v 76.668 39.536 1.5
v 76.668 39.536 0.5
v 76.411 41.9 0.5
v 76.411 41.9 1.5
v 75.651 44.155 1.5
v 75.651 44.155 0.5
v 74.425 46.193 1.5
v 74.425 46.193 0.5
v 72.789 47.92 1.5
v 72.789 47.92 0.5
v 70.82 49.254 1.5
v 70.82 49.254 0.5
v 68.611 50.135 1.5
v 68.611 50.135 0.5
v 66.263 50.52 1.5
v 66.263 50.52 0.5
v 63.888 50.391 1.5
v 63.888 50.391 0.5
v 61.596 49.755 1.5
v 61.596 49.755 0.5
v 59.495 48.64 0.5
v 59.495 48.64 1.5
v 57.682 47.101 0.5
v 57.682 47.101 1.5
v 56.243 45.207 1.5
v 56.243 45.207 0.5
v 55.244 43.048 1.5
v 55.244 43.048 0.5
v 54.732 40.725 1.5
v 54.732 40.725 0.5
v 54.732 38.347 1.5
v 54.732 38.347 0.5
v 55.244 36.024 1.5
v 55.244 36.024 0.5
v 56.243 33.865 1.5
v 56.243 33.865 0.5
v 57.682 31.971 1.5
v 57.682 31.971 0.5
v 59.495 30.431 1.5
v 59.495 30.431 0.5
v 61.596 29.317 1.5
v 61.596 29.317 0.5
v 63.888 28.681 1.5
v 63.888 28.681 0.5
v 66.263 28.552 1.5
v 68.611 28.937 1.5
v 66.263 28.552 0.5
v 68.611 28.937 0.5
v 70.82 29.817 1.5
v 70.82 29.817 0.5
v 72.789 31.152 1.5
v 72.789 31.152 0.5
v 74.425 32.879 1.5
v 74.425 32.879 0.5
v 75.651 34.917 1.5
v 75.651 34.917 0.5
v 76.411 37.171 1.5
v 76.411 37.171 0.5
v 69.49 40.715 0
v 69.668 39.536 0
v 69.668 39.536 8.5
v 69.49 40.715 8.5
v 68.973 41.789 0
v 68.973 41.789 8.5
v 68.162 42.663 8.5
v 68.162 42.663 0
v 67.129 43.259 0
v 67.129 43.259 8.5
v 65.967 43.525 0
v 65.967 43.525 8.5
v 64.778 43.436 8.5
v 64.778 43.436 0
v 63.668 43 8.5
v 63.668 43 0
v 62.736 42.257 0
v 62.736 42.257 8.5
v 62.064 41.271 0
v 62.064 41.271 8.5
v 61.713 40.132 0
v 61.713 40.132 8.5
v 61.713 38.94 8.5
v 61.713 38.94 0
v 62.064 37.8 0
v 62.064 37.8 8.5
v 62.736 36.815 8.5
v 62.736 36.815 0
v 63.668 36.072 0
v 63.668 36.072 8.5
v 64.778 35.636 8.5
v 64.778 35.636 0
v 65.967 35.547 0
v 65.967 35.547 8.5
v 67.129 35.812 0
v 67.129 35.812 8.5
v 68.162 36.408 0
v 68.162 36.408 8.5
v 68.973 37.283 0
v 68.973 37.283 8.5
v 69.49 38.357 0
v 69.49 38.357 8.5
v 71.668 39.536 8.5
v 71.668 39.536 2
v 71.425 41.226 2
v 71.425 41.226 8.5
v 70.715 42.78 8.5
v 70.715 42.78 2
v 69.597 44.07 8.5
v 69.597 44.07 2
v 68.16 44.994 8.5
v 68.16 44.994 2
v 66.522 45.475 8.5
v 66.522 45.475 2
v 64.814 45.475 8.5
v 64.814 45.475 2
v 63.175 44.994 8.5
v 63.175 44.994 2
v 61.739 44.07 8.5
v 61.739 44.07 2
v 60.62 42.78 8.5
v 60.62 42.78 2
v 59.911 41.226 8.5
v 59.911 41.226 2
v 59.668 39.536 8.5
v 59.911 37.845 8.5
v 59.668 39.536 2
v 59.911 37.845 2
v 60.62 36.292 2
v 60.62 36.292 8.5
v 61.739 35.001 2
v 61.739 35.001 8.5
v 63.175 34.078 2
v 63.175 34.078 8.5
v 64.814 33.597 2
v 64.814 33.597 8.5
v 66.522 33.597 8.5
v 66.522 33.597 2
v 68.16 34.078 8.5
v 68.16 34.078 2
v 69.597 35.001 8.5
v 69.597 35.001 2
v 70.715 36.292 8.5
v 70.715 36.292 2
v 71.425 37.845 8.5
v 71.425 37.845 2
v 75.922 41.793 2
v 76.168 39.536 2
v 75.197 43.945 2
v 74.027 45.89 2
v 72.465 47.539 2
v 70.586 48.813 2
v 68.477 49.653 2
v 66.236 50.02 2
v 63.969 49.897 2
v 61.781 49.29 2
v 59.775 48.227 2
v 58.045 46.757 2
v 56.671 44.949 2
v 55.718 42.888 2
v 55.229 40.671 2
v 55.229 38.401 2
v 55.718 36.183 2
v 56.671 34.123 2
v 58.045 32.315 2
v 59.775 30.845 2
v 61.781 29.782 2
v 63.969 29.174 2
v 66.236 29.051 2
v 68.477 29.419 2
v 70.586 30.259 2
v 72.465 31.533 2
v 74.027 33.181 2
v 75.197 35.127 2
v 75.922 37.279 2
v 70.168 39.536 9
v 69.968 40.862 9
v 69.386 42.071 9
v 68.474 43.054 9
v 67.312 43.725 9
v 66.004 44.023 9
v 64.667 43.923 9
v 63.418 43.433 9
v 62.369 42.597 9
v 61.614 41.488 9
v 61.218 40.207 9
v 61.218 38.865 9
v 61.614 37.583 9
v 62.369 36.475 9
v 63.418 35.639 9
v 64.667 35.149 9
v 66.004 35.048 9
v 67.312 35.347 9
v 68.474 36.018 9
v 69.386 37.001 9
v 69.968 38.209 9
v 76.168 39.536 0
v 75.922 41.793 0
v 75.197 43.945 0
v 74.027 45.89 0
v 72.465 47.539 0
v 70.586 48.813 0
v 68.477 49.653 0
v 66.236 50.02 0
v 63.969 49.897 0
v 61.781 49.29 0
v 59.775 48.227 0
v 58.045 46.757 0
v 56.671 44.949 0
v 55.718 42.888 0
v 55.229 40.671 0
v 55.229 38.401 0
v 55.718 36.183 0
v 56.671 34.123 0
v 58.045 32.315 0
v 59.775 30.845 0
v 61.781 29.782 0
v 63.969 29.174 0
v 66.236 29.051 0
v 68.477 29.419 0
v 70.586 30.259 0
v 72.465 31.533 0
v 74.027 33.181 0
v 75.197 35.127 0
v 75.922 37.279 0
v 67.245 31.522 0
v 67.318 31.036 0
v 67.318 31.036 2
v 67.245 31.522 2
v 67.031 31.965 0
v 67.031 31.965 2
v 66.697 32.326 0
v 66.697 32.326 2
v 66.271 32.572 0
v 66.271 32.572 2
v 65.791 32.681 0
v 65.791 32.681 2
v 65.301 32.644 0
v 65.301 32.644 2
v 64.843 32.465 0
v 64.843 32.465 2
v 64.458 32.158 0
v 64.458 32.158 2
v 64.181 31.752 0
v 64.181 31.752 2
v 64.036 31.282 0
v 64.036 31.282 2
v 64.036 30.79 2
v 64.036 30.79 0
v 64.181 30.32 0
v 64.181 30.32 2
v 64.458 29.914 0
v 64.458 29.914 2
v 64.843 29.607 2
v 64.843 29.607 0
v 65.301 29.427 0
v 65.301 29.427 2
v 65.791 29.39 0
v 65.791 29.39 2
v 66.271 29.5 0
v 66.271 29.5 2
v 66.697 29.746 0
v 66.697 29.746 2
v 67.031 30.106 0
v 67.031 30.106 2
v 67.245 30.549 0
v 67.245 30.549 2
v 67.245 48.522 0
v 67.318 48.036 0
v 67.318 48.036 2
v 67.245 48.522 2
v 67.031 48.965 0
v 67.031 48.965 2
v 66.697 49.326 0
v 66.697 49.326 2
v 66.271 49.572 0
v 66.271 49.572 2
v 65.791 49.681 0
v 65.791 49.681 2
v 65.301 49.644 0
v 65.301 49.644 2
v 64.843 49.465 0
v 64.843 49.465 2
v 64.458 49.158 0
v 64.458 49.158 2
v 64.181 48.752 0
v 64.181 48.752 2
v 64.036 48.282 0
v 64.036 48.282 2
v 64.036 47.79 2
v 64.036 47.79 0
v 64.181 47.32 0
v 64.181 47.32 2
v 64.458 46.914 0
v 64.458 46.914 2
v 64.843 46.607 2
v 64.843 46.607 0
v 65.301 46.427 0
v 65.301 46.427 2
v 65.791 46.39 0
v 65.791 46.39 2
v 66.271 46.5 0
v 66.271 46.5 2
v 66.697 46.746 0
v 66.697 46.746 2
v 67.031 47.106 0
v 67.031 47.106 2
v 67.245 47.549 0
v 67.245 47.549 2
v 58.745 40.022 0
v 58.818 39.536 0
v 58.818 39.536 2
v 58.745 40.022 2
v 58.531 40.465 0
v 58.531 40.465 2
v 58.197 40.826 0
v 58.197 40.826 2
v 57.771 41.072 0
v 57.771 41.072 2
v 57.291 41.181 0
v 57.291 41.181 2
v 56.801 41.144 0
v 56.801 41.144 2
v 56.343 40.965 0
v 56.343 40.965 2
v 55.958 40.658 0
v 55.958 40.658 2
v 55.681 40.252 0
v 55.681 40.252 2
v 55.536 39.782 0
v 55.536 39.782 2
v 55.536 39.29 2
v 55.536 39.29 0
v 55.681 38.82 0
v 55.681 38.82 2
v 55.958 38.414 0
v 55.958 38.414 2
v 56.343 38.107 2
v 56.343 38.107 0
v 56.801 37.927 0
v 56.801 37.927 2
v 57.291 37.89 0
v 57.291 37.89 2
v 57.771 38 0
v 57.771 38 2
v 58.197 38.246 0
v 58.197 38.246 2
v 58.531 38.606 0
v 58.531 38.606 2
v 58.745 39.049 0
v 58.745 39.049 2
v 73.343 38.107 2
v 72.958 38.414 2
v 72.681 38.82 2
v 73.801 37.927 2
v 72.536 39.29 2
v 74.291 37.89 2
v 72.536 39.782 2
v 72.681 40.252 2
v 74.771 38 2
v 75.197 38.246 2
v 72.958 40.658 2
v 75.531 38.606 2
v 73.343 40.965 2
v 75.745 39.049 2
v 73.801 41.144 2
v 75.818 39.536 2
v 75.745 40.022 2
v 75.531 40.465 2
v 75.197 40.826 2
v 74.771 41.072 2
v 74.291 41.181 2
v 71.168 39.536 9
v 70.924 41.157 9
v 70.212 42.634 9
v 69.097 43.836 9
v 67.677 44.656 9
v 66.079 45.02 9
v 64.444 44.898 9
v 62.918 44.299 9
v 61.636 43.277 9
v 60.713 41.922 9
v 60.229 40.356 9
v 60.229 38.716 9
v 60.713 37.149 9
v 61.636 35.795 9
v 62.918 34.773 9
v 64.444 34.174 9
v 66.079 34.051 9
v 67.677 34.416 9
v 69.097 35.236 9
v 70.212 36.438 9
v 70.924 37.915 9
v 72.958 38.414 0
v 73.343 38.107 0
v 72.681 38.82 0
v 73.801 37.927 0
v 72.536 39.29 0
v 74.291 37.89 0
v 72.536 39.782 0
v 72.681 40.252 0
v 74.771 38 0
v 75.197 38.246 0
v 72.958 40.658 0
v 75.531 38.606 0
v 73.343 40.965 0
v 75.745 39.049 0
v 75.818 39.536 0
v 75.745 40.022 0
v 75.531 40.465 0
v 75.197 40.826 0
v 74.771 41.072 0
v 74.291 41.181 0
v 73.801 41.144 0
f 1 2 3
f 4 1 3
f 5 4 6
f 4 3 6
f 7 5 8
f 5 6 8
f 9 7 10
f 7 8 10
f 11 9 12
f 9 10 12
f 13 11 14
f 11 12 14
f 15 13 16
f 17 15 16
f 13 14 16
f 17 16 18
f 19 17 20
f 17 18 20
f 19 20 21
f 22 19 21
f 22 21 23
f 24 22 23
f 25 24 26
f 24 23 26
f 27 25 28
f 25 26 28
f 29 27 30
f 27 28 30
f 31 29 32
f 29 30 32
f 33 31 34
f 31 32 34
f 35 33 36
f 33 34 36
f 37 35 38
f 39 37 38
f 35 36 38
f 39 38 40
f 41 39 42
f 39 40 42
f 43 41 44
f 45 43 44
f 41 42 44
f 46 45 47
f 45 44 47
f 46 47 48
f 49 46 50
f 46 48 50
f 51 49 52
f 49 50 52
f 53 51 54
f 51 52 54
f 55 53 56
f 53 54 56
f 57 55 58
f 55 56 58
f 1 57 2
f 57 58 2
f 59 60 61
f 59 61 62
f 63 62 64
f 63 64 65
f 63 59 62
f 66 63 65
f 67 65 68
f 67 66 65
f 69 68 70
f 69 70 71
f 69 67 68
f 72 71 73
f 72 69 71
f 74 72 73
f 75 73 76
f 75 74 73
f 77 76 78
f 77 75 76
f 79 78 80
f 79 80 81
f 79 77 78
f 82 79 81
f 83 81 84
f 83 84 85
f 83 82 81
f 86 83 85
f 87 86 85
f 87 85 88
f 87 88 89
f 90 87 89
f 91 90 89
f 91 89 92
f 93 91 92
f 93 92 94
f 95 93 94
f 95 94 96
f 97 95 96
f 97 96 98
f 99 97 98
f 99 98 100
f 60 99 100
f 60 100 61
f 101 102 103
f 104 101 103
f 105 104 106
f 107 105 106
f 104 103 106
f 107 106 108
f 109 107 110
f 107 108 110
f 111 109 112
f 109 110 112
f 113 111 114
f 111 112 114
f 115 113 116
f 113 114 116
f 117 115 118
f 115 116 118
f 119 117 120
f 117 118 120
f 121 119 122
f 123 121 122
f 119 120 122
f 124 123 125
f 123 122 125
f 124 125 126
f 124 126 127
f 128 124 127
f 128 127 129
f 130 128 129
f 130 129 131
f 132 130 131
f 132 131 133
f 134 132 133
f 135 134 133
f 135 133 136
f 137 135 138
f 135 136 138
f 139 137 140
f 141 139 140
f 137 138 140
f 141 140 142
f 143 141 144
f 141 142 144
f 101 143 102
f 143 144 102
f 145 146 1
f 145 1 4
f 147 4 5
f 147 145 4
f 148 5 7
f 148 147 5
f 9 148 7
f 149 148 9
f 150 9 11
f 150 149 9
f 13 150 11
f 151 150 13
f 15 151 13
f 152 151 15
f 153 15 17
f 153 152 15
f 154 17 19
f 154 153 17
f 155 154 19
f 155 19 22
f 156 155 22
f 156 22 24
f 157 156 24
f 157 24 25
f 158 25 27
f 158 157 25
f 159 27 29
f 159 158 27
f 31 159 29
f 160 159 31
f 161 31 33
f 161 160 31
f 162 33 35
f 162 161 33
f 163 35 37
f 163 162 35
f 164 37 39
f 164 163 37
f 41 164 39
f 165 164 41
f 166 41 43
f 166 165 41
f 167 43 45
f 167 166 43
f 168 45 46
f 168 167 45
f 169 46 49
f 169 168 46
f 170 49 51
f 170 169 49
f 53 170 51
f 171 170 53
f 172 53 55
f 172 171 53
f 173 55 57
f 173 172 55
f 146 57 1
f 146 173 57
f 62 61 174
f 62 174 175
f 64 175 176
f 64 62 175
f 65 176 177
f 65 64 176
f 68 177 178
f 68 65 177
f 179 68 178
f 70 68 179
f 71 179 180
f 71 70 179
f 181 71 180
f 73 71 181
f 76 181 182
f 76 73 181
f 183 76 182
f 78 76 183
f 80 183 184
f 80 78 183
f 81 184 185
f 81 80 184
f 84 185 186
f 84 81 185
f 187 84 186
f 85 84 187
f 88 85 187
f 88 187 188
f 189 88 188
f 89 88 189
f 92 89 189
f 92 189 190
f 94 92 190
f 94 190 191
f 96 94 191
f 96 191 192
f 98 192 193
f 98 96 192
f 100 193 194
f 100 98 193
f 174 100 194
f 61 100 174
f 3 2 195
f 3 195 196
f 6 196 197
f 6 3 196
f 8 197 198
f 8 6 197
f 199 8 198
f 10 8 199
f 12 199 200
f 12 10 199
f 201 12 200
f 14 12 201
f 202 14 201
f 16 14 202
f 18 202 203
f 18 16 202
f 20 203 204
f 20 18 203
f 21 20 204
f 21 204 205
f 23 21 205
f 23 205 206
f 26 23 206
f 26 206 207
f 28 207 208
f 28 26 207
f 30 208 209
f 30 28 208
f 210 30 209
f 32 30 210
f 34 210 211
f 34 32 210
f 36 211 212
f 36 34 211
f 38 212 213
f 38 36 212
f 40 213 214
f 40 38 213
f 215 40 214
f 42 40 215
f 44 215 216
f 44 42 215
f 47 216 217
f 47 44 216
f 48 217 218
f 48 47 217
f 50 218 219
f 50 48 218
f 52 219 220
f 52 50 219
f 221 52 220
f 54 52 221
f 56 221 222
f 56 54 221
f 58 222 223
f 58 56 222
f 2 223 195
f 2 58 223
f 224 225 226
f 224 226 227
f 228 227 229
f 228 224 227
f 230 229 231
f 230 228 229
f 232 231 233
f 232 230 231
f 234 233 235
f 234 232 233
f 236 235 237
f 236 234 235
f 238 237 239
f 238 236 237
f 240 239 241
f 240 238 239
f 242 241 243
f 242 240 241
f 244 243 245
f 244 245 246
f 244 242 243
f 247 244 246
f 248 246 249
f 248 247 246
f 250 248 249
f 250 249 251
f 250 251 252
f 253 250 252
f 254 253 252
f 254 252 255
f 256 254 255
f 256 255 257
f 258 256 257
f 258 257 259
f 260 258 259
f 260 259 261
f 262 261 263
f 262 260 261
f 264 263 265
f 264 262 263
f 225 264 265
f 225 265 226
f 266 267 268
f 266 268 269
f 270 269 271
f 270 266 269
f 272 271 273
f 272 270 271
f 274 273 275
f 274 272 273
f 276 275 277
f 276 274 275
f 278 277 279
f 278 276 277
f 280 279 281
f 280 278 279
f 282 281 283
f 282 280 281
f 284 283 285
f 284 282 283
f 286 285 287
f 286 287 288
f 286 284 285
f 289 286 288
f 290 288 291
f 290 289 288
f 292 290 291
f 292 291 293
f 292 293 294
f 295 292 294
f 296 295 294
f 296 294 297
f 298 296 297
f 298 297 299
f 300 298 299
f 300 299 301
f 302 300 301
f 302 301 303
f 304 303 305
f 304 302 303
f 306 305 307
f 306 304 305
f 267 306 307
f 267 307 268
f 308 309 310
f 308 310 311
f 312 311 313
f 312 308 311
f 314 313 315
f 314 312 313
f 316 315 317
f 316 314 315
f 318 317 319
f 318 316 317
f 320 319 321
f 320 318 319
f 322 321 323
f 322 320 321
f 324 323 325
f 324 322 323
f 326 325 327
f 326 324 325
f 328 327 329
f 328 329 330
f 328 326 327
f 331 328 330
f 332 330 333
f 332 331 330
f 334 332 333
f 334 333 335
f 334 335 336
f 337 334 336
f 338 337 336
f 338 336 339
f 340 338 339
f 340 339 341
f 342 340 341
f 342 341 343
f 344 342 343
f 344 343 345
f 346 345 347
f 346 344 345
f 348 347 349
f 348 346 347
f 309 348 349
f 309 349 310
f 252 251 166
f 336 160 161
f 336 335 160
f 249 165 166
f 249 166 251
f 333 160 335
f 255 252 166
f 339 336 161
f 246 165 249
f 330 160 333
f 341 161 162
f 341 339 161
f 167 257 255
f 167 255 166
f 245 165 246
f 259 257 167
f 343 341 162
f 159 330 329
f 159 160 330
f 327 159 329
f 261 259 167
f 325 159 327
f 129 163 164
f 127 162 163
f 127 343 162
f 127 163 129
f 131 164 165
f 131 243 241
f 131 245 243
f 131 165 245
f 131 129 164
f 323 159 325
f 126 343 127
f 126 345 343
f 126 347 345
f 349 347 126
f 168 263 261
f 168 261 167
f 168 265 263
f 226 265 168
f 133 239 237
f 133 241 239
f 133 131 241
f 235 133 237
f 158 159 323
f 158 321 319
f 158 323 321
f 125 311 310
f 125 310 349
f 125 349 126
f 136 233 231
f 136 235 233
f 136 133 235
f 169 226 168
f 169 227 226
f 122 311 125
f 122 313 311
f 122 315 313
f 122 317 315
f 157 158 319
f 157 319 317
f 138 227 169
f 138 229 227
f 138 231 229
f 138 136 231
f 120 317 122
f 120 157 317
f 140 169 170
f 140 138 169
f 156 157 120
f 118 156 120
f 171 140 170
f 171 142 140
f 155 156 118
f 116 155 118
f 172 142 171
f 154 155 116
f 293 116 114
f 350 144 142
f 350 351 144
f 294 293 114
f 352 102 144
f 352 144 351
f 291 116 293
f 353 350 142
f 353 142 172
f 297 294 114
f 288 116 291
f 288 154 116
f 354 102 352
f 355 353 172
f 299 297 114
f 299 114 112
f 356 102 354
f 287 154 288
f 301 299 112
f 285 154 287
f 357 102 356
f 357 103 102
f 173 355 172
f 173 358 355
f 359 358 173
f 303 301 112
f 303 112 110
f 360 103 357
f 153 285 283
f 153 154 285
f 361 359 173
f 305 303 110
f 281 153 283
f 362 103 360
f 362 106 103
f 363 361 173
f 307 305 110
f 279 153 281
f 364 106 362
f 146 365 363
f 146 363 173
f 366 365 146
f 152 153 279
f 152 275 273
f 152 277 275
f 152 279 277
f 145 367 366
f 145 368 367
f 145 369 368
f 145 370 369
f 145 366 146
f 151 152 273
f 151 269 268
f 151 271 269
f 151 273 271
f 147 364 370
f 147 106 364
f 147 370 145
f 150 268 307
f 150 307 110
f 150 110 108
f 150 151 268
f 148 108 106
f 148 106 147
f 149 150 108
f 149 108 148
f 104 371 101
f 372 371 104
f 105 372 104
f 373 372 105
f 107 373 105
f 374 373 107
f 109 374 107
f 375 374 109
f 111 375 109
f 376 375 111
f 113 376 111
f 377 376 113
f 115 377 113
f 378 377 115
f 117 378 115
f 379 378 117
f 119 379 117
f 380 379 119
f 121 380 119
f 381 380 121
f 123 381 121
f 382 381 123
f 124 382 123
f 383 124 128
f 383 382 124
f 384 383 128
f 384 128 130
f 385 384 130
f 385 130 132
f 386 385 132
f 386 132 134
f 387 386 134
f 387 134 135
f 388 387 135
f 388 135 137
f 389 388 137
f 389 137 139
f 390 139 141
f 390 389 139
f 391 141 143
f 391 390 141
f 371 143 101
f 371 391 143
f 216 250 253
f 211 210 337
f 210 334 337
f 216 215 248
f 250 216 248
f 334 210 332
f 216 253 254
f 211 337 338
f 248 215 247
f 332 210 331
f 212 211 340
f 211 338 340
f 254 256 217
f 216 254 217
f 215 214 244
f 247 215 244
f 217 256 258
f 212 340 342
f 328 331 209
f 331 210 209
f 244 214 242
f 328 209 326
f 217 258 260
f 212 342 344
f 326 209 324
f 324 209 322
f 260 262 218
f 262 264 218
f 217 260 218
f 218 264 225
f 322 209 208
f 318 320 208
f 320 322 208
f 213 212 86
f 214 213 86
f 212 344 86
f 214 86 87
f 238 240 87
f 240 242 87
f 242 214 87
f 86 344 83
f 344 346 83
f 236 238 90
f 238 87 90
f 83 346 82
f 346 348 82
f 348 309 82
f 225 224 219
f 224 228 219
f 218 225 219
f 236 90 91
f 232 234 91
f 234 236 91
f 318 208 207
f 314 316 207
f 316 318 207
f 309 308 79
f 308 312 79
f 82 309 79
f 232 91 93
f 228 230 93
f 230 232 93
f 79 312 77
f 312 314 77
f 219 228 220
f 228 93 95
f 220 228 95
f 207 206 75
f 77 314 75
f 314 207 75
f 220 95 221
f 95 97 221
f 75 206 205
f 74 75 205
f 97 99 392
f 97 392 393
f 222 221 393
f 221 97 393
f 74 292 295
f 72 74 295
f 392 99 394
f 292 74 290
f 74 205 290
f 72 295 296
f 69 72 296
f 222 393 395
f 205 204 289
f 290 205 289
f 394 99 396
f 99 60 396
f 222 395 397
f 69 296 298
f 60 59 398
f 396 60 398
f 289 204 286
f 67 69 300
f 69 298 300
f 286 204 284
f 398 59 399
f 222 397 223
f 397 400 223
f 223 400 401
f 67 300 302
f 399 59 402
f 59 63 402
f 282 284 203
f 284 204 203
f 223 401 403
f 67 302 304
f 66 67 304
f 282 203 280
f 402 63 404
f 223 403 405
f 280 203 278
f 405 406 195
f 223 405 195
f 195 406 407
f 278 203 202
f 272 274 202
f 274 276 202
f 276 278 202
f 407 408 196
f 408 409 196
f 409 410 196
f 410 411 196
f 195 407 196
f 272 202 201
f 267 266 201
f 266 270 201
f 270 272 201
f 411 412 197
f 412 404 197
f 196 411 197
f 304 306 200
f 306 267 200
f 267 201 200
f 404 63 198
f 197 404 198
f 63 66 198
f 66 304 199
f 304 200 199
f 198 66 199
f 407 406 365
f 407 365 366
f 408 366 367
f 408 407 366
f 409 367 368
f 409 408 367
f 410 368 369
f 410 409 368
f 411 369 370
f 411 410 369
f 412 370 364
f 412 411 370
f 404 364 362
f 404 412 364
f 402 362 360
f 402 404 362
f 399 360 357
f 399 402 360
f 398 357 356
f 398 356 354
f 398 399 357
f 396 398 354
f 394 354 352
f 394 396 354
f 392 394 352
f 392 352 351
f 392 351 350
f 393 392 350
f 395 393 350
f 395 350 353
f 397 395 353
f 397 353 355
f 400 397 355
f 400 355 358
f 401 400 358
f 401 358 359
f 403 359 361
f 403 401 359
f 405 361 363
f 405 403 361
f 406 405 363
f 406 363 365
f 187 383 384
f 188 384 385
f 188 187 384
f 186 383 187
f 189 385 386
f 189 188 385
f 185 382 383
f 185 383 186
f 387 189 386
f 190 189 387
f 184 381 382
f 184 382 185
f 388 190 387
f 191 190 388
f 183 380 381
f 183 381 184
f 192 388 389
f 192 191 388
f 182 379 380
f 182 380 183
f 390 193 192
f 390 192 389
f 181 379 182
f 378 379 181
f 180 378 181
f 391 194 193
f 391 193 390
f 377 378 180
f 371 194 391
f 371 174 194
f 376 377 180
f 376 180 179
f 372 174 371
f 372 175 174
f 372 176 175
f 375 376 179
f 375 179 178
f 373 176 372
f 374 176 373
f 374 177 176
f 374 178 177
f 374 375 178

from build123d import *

# Parameters (mm, degrees)
ESQUISSE1_R        = 11
ESQUISSE1_R_2      = 4
ESQUISSE1_R_3      = 1.65
BOSS_EXTRU_1_DEPTH = 2
ESQUISSE2_R        = 6
ESQUISSE2_R_2      = 4
BOSS_EXTRU_2_DEPTH = 7
CHANFREIN1_SIZE    = 0.5


with BuildPart() as part:
    # Esquisse1 → Boss.-Extru.1 (new body)
    with BuildSketch(Plane.XY):
        with Locations((65.66793974, 39.535817655)):
            Circle(ESQUISSE1_R)
        with Locations((65.66793974, 39.535817655)):
            Circle(ESQUISSE1_R_2, mode=Mode.SUBTRACT)
        with Locations((65.66793974, 48.035817655)):
            Circle(ESQUISSE1_R_3, mode=Mode.SUBTRACT)
        with Locations((74.16793974, 39.535817655)):
            Circle(ESQUISSE1_R_3, mode=Mode.SUBTRACT)
        with Locations((65.66793974, 31.035817655)):
            Circle(ESQUISSE1_R_3, mode=Mode.SUBTRACT)
        with Locations((57.16793974, 39.535817655)):
            Circle(ESQUISSE1_R_3, mode=Mode.SUBTRACT)
    extrude(amount=BOSS_EXTRU_1_DEPTH)

    # Esquisse2 → Boss.-Extru.2 (add)
    with BuildSketch(Plane.XY.offset(2)):
        with Locations((65.66793974, 39.535817655)):
            Circle(ESQUISSE2_R)
        with Locations((65.66793974, 39.535817655)):
            Circle(ESQUISSE2_R_2, mode=Mode.SUBTRACT)
    extrude(amount=BOSS_EXTRU_2_DEPTH)

    # Chanfrein1
    chanfrein1_edges = [part.edges().sort_by_distance(p)[0] for p in [
        (54.66793974, 39.535817655, 0),
        (59.66793974, 39.535817655, 9),
        (61.66793974, 39.535817655, 9),
        (54.66793974, 39.535817655, 2),
    ]]
    chamfer(chanfrein1_edges, length=CHANFREIN1_SIZE)


solid = part.part
